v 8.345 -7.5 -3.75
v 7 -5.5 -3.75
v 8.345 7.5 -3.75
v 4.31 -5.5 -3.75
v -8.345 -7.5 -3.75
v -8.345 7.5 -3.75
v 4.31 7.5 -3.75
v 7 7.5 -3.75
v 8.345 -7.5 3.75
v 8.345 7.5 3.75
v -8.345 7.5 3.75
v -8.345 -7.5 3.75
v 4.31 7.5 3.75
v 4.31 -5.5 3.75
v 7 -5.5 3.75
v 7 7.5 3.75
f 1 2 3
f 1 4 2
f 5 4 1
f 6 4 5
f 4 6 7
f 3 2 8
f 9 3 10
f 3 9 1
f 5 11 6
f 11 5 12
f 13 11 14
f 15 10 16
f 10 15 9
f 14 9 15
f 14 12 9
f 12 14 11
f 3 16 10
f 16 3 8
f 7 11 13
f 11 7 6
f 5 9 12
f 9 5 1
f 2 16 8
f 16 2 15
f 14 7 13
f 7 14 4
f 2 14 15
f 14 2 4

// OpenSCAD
t = 2;
height = 7.5;
gap = 2.69;
w = 12;
l = 15;

rotate([0, 90, 0])
difference(){
    cube([height, l, w + gap + t], center=true);
    translate([0, t/2, (w + gap + t) / 2 - gap])
    cube([height, l-t, gap], center=true);
}
